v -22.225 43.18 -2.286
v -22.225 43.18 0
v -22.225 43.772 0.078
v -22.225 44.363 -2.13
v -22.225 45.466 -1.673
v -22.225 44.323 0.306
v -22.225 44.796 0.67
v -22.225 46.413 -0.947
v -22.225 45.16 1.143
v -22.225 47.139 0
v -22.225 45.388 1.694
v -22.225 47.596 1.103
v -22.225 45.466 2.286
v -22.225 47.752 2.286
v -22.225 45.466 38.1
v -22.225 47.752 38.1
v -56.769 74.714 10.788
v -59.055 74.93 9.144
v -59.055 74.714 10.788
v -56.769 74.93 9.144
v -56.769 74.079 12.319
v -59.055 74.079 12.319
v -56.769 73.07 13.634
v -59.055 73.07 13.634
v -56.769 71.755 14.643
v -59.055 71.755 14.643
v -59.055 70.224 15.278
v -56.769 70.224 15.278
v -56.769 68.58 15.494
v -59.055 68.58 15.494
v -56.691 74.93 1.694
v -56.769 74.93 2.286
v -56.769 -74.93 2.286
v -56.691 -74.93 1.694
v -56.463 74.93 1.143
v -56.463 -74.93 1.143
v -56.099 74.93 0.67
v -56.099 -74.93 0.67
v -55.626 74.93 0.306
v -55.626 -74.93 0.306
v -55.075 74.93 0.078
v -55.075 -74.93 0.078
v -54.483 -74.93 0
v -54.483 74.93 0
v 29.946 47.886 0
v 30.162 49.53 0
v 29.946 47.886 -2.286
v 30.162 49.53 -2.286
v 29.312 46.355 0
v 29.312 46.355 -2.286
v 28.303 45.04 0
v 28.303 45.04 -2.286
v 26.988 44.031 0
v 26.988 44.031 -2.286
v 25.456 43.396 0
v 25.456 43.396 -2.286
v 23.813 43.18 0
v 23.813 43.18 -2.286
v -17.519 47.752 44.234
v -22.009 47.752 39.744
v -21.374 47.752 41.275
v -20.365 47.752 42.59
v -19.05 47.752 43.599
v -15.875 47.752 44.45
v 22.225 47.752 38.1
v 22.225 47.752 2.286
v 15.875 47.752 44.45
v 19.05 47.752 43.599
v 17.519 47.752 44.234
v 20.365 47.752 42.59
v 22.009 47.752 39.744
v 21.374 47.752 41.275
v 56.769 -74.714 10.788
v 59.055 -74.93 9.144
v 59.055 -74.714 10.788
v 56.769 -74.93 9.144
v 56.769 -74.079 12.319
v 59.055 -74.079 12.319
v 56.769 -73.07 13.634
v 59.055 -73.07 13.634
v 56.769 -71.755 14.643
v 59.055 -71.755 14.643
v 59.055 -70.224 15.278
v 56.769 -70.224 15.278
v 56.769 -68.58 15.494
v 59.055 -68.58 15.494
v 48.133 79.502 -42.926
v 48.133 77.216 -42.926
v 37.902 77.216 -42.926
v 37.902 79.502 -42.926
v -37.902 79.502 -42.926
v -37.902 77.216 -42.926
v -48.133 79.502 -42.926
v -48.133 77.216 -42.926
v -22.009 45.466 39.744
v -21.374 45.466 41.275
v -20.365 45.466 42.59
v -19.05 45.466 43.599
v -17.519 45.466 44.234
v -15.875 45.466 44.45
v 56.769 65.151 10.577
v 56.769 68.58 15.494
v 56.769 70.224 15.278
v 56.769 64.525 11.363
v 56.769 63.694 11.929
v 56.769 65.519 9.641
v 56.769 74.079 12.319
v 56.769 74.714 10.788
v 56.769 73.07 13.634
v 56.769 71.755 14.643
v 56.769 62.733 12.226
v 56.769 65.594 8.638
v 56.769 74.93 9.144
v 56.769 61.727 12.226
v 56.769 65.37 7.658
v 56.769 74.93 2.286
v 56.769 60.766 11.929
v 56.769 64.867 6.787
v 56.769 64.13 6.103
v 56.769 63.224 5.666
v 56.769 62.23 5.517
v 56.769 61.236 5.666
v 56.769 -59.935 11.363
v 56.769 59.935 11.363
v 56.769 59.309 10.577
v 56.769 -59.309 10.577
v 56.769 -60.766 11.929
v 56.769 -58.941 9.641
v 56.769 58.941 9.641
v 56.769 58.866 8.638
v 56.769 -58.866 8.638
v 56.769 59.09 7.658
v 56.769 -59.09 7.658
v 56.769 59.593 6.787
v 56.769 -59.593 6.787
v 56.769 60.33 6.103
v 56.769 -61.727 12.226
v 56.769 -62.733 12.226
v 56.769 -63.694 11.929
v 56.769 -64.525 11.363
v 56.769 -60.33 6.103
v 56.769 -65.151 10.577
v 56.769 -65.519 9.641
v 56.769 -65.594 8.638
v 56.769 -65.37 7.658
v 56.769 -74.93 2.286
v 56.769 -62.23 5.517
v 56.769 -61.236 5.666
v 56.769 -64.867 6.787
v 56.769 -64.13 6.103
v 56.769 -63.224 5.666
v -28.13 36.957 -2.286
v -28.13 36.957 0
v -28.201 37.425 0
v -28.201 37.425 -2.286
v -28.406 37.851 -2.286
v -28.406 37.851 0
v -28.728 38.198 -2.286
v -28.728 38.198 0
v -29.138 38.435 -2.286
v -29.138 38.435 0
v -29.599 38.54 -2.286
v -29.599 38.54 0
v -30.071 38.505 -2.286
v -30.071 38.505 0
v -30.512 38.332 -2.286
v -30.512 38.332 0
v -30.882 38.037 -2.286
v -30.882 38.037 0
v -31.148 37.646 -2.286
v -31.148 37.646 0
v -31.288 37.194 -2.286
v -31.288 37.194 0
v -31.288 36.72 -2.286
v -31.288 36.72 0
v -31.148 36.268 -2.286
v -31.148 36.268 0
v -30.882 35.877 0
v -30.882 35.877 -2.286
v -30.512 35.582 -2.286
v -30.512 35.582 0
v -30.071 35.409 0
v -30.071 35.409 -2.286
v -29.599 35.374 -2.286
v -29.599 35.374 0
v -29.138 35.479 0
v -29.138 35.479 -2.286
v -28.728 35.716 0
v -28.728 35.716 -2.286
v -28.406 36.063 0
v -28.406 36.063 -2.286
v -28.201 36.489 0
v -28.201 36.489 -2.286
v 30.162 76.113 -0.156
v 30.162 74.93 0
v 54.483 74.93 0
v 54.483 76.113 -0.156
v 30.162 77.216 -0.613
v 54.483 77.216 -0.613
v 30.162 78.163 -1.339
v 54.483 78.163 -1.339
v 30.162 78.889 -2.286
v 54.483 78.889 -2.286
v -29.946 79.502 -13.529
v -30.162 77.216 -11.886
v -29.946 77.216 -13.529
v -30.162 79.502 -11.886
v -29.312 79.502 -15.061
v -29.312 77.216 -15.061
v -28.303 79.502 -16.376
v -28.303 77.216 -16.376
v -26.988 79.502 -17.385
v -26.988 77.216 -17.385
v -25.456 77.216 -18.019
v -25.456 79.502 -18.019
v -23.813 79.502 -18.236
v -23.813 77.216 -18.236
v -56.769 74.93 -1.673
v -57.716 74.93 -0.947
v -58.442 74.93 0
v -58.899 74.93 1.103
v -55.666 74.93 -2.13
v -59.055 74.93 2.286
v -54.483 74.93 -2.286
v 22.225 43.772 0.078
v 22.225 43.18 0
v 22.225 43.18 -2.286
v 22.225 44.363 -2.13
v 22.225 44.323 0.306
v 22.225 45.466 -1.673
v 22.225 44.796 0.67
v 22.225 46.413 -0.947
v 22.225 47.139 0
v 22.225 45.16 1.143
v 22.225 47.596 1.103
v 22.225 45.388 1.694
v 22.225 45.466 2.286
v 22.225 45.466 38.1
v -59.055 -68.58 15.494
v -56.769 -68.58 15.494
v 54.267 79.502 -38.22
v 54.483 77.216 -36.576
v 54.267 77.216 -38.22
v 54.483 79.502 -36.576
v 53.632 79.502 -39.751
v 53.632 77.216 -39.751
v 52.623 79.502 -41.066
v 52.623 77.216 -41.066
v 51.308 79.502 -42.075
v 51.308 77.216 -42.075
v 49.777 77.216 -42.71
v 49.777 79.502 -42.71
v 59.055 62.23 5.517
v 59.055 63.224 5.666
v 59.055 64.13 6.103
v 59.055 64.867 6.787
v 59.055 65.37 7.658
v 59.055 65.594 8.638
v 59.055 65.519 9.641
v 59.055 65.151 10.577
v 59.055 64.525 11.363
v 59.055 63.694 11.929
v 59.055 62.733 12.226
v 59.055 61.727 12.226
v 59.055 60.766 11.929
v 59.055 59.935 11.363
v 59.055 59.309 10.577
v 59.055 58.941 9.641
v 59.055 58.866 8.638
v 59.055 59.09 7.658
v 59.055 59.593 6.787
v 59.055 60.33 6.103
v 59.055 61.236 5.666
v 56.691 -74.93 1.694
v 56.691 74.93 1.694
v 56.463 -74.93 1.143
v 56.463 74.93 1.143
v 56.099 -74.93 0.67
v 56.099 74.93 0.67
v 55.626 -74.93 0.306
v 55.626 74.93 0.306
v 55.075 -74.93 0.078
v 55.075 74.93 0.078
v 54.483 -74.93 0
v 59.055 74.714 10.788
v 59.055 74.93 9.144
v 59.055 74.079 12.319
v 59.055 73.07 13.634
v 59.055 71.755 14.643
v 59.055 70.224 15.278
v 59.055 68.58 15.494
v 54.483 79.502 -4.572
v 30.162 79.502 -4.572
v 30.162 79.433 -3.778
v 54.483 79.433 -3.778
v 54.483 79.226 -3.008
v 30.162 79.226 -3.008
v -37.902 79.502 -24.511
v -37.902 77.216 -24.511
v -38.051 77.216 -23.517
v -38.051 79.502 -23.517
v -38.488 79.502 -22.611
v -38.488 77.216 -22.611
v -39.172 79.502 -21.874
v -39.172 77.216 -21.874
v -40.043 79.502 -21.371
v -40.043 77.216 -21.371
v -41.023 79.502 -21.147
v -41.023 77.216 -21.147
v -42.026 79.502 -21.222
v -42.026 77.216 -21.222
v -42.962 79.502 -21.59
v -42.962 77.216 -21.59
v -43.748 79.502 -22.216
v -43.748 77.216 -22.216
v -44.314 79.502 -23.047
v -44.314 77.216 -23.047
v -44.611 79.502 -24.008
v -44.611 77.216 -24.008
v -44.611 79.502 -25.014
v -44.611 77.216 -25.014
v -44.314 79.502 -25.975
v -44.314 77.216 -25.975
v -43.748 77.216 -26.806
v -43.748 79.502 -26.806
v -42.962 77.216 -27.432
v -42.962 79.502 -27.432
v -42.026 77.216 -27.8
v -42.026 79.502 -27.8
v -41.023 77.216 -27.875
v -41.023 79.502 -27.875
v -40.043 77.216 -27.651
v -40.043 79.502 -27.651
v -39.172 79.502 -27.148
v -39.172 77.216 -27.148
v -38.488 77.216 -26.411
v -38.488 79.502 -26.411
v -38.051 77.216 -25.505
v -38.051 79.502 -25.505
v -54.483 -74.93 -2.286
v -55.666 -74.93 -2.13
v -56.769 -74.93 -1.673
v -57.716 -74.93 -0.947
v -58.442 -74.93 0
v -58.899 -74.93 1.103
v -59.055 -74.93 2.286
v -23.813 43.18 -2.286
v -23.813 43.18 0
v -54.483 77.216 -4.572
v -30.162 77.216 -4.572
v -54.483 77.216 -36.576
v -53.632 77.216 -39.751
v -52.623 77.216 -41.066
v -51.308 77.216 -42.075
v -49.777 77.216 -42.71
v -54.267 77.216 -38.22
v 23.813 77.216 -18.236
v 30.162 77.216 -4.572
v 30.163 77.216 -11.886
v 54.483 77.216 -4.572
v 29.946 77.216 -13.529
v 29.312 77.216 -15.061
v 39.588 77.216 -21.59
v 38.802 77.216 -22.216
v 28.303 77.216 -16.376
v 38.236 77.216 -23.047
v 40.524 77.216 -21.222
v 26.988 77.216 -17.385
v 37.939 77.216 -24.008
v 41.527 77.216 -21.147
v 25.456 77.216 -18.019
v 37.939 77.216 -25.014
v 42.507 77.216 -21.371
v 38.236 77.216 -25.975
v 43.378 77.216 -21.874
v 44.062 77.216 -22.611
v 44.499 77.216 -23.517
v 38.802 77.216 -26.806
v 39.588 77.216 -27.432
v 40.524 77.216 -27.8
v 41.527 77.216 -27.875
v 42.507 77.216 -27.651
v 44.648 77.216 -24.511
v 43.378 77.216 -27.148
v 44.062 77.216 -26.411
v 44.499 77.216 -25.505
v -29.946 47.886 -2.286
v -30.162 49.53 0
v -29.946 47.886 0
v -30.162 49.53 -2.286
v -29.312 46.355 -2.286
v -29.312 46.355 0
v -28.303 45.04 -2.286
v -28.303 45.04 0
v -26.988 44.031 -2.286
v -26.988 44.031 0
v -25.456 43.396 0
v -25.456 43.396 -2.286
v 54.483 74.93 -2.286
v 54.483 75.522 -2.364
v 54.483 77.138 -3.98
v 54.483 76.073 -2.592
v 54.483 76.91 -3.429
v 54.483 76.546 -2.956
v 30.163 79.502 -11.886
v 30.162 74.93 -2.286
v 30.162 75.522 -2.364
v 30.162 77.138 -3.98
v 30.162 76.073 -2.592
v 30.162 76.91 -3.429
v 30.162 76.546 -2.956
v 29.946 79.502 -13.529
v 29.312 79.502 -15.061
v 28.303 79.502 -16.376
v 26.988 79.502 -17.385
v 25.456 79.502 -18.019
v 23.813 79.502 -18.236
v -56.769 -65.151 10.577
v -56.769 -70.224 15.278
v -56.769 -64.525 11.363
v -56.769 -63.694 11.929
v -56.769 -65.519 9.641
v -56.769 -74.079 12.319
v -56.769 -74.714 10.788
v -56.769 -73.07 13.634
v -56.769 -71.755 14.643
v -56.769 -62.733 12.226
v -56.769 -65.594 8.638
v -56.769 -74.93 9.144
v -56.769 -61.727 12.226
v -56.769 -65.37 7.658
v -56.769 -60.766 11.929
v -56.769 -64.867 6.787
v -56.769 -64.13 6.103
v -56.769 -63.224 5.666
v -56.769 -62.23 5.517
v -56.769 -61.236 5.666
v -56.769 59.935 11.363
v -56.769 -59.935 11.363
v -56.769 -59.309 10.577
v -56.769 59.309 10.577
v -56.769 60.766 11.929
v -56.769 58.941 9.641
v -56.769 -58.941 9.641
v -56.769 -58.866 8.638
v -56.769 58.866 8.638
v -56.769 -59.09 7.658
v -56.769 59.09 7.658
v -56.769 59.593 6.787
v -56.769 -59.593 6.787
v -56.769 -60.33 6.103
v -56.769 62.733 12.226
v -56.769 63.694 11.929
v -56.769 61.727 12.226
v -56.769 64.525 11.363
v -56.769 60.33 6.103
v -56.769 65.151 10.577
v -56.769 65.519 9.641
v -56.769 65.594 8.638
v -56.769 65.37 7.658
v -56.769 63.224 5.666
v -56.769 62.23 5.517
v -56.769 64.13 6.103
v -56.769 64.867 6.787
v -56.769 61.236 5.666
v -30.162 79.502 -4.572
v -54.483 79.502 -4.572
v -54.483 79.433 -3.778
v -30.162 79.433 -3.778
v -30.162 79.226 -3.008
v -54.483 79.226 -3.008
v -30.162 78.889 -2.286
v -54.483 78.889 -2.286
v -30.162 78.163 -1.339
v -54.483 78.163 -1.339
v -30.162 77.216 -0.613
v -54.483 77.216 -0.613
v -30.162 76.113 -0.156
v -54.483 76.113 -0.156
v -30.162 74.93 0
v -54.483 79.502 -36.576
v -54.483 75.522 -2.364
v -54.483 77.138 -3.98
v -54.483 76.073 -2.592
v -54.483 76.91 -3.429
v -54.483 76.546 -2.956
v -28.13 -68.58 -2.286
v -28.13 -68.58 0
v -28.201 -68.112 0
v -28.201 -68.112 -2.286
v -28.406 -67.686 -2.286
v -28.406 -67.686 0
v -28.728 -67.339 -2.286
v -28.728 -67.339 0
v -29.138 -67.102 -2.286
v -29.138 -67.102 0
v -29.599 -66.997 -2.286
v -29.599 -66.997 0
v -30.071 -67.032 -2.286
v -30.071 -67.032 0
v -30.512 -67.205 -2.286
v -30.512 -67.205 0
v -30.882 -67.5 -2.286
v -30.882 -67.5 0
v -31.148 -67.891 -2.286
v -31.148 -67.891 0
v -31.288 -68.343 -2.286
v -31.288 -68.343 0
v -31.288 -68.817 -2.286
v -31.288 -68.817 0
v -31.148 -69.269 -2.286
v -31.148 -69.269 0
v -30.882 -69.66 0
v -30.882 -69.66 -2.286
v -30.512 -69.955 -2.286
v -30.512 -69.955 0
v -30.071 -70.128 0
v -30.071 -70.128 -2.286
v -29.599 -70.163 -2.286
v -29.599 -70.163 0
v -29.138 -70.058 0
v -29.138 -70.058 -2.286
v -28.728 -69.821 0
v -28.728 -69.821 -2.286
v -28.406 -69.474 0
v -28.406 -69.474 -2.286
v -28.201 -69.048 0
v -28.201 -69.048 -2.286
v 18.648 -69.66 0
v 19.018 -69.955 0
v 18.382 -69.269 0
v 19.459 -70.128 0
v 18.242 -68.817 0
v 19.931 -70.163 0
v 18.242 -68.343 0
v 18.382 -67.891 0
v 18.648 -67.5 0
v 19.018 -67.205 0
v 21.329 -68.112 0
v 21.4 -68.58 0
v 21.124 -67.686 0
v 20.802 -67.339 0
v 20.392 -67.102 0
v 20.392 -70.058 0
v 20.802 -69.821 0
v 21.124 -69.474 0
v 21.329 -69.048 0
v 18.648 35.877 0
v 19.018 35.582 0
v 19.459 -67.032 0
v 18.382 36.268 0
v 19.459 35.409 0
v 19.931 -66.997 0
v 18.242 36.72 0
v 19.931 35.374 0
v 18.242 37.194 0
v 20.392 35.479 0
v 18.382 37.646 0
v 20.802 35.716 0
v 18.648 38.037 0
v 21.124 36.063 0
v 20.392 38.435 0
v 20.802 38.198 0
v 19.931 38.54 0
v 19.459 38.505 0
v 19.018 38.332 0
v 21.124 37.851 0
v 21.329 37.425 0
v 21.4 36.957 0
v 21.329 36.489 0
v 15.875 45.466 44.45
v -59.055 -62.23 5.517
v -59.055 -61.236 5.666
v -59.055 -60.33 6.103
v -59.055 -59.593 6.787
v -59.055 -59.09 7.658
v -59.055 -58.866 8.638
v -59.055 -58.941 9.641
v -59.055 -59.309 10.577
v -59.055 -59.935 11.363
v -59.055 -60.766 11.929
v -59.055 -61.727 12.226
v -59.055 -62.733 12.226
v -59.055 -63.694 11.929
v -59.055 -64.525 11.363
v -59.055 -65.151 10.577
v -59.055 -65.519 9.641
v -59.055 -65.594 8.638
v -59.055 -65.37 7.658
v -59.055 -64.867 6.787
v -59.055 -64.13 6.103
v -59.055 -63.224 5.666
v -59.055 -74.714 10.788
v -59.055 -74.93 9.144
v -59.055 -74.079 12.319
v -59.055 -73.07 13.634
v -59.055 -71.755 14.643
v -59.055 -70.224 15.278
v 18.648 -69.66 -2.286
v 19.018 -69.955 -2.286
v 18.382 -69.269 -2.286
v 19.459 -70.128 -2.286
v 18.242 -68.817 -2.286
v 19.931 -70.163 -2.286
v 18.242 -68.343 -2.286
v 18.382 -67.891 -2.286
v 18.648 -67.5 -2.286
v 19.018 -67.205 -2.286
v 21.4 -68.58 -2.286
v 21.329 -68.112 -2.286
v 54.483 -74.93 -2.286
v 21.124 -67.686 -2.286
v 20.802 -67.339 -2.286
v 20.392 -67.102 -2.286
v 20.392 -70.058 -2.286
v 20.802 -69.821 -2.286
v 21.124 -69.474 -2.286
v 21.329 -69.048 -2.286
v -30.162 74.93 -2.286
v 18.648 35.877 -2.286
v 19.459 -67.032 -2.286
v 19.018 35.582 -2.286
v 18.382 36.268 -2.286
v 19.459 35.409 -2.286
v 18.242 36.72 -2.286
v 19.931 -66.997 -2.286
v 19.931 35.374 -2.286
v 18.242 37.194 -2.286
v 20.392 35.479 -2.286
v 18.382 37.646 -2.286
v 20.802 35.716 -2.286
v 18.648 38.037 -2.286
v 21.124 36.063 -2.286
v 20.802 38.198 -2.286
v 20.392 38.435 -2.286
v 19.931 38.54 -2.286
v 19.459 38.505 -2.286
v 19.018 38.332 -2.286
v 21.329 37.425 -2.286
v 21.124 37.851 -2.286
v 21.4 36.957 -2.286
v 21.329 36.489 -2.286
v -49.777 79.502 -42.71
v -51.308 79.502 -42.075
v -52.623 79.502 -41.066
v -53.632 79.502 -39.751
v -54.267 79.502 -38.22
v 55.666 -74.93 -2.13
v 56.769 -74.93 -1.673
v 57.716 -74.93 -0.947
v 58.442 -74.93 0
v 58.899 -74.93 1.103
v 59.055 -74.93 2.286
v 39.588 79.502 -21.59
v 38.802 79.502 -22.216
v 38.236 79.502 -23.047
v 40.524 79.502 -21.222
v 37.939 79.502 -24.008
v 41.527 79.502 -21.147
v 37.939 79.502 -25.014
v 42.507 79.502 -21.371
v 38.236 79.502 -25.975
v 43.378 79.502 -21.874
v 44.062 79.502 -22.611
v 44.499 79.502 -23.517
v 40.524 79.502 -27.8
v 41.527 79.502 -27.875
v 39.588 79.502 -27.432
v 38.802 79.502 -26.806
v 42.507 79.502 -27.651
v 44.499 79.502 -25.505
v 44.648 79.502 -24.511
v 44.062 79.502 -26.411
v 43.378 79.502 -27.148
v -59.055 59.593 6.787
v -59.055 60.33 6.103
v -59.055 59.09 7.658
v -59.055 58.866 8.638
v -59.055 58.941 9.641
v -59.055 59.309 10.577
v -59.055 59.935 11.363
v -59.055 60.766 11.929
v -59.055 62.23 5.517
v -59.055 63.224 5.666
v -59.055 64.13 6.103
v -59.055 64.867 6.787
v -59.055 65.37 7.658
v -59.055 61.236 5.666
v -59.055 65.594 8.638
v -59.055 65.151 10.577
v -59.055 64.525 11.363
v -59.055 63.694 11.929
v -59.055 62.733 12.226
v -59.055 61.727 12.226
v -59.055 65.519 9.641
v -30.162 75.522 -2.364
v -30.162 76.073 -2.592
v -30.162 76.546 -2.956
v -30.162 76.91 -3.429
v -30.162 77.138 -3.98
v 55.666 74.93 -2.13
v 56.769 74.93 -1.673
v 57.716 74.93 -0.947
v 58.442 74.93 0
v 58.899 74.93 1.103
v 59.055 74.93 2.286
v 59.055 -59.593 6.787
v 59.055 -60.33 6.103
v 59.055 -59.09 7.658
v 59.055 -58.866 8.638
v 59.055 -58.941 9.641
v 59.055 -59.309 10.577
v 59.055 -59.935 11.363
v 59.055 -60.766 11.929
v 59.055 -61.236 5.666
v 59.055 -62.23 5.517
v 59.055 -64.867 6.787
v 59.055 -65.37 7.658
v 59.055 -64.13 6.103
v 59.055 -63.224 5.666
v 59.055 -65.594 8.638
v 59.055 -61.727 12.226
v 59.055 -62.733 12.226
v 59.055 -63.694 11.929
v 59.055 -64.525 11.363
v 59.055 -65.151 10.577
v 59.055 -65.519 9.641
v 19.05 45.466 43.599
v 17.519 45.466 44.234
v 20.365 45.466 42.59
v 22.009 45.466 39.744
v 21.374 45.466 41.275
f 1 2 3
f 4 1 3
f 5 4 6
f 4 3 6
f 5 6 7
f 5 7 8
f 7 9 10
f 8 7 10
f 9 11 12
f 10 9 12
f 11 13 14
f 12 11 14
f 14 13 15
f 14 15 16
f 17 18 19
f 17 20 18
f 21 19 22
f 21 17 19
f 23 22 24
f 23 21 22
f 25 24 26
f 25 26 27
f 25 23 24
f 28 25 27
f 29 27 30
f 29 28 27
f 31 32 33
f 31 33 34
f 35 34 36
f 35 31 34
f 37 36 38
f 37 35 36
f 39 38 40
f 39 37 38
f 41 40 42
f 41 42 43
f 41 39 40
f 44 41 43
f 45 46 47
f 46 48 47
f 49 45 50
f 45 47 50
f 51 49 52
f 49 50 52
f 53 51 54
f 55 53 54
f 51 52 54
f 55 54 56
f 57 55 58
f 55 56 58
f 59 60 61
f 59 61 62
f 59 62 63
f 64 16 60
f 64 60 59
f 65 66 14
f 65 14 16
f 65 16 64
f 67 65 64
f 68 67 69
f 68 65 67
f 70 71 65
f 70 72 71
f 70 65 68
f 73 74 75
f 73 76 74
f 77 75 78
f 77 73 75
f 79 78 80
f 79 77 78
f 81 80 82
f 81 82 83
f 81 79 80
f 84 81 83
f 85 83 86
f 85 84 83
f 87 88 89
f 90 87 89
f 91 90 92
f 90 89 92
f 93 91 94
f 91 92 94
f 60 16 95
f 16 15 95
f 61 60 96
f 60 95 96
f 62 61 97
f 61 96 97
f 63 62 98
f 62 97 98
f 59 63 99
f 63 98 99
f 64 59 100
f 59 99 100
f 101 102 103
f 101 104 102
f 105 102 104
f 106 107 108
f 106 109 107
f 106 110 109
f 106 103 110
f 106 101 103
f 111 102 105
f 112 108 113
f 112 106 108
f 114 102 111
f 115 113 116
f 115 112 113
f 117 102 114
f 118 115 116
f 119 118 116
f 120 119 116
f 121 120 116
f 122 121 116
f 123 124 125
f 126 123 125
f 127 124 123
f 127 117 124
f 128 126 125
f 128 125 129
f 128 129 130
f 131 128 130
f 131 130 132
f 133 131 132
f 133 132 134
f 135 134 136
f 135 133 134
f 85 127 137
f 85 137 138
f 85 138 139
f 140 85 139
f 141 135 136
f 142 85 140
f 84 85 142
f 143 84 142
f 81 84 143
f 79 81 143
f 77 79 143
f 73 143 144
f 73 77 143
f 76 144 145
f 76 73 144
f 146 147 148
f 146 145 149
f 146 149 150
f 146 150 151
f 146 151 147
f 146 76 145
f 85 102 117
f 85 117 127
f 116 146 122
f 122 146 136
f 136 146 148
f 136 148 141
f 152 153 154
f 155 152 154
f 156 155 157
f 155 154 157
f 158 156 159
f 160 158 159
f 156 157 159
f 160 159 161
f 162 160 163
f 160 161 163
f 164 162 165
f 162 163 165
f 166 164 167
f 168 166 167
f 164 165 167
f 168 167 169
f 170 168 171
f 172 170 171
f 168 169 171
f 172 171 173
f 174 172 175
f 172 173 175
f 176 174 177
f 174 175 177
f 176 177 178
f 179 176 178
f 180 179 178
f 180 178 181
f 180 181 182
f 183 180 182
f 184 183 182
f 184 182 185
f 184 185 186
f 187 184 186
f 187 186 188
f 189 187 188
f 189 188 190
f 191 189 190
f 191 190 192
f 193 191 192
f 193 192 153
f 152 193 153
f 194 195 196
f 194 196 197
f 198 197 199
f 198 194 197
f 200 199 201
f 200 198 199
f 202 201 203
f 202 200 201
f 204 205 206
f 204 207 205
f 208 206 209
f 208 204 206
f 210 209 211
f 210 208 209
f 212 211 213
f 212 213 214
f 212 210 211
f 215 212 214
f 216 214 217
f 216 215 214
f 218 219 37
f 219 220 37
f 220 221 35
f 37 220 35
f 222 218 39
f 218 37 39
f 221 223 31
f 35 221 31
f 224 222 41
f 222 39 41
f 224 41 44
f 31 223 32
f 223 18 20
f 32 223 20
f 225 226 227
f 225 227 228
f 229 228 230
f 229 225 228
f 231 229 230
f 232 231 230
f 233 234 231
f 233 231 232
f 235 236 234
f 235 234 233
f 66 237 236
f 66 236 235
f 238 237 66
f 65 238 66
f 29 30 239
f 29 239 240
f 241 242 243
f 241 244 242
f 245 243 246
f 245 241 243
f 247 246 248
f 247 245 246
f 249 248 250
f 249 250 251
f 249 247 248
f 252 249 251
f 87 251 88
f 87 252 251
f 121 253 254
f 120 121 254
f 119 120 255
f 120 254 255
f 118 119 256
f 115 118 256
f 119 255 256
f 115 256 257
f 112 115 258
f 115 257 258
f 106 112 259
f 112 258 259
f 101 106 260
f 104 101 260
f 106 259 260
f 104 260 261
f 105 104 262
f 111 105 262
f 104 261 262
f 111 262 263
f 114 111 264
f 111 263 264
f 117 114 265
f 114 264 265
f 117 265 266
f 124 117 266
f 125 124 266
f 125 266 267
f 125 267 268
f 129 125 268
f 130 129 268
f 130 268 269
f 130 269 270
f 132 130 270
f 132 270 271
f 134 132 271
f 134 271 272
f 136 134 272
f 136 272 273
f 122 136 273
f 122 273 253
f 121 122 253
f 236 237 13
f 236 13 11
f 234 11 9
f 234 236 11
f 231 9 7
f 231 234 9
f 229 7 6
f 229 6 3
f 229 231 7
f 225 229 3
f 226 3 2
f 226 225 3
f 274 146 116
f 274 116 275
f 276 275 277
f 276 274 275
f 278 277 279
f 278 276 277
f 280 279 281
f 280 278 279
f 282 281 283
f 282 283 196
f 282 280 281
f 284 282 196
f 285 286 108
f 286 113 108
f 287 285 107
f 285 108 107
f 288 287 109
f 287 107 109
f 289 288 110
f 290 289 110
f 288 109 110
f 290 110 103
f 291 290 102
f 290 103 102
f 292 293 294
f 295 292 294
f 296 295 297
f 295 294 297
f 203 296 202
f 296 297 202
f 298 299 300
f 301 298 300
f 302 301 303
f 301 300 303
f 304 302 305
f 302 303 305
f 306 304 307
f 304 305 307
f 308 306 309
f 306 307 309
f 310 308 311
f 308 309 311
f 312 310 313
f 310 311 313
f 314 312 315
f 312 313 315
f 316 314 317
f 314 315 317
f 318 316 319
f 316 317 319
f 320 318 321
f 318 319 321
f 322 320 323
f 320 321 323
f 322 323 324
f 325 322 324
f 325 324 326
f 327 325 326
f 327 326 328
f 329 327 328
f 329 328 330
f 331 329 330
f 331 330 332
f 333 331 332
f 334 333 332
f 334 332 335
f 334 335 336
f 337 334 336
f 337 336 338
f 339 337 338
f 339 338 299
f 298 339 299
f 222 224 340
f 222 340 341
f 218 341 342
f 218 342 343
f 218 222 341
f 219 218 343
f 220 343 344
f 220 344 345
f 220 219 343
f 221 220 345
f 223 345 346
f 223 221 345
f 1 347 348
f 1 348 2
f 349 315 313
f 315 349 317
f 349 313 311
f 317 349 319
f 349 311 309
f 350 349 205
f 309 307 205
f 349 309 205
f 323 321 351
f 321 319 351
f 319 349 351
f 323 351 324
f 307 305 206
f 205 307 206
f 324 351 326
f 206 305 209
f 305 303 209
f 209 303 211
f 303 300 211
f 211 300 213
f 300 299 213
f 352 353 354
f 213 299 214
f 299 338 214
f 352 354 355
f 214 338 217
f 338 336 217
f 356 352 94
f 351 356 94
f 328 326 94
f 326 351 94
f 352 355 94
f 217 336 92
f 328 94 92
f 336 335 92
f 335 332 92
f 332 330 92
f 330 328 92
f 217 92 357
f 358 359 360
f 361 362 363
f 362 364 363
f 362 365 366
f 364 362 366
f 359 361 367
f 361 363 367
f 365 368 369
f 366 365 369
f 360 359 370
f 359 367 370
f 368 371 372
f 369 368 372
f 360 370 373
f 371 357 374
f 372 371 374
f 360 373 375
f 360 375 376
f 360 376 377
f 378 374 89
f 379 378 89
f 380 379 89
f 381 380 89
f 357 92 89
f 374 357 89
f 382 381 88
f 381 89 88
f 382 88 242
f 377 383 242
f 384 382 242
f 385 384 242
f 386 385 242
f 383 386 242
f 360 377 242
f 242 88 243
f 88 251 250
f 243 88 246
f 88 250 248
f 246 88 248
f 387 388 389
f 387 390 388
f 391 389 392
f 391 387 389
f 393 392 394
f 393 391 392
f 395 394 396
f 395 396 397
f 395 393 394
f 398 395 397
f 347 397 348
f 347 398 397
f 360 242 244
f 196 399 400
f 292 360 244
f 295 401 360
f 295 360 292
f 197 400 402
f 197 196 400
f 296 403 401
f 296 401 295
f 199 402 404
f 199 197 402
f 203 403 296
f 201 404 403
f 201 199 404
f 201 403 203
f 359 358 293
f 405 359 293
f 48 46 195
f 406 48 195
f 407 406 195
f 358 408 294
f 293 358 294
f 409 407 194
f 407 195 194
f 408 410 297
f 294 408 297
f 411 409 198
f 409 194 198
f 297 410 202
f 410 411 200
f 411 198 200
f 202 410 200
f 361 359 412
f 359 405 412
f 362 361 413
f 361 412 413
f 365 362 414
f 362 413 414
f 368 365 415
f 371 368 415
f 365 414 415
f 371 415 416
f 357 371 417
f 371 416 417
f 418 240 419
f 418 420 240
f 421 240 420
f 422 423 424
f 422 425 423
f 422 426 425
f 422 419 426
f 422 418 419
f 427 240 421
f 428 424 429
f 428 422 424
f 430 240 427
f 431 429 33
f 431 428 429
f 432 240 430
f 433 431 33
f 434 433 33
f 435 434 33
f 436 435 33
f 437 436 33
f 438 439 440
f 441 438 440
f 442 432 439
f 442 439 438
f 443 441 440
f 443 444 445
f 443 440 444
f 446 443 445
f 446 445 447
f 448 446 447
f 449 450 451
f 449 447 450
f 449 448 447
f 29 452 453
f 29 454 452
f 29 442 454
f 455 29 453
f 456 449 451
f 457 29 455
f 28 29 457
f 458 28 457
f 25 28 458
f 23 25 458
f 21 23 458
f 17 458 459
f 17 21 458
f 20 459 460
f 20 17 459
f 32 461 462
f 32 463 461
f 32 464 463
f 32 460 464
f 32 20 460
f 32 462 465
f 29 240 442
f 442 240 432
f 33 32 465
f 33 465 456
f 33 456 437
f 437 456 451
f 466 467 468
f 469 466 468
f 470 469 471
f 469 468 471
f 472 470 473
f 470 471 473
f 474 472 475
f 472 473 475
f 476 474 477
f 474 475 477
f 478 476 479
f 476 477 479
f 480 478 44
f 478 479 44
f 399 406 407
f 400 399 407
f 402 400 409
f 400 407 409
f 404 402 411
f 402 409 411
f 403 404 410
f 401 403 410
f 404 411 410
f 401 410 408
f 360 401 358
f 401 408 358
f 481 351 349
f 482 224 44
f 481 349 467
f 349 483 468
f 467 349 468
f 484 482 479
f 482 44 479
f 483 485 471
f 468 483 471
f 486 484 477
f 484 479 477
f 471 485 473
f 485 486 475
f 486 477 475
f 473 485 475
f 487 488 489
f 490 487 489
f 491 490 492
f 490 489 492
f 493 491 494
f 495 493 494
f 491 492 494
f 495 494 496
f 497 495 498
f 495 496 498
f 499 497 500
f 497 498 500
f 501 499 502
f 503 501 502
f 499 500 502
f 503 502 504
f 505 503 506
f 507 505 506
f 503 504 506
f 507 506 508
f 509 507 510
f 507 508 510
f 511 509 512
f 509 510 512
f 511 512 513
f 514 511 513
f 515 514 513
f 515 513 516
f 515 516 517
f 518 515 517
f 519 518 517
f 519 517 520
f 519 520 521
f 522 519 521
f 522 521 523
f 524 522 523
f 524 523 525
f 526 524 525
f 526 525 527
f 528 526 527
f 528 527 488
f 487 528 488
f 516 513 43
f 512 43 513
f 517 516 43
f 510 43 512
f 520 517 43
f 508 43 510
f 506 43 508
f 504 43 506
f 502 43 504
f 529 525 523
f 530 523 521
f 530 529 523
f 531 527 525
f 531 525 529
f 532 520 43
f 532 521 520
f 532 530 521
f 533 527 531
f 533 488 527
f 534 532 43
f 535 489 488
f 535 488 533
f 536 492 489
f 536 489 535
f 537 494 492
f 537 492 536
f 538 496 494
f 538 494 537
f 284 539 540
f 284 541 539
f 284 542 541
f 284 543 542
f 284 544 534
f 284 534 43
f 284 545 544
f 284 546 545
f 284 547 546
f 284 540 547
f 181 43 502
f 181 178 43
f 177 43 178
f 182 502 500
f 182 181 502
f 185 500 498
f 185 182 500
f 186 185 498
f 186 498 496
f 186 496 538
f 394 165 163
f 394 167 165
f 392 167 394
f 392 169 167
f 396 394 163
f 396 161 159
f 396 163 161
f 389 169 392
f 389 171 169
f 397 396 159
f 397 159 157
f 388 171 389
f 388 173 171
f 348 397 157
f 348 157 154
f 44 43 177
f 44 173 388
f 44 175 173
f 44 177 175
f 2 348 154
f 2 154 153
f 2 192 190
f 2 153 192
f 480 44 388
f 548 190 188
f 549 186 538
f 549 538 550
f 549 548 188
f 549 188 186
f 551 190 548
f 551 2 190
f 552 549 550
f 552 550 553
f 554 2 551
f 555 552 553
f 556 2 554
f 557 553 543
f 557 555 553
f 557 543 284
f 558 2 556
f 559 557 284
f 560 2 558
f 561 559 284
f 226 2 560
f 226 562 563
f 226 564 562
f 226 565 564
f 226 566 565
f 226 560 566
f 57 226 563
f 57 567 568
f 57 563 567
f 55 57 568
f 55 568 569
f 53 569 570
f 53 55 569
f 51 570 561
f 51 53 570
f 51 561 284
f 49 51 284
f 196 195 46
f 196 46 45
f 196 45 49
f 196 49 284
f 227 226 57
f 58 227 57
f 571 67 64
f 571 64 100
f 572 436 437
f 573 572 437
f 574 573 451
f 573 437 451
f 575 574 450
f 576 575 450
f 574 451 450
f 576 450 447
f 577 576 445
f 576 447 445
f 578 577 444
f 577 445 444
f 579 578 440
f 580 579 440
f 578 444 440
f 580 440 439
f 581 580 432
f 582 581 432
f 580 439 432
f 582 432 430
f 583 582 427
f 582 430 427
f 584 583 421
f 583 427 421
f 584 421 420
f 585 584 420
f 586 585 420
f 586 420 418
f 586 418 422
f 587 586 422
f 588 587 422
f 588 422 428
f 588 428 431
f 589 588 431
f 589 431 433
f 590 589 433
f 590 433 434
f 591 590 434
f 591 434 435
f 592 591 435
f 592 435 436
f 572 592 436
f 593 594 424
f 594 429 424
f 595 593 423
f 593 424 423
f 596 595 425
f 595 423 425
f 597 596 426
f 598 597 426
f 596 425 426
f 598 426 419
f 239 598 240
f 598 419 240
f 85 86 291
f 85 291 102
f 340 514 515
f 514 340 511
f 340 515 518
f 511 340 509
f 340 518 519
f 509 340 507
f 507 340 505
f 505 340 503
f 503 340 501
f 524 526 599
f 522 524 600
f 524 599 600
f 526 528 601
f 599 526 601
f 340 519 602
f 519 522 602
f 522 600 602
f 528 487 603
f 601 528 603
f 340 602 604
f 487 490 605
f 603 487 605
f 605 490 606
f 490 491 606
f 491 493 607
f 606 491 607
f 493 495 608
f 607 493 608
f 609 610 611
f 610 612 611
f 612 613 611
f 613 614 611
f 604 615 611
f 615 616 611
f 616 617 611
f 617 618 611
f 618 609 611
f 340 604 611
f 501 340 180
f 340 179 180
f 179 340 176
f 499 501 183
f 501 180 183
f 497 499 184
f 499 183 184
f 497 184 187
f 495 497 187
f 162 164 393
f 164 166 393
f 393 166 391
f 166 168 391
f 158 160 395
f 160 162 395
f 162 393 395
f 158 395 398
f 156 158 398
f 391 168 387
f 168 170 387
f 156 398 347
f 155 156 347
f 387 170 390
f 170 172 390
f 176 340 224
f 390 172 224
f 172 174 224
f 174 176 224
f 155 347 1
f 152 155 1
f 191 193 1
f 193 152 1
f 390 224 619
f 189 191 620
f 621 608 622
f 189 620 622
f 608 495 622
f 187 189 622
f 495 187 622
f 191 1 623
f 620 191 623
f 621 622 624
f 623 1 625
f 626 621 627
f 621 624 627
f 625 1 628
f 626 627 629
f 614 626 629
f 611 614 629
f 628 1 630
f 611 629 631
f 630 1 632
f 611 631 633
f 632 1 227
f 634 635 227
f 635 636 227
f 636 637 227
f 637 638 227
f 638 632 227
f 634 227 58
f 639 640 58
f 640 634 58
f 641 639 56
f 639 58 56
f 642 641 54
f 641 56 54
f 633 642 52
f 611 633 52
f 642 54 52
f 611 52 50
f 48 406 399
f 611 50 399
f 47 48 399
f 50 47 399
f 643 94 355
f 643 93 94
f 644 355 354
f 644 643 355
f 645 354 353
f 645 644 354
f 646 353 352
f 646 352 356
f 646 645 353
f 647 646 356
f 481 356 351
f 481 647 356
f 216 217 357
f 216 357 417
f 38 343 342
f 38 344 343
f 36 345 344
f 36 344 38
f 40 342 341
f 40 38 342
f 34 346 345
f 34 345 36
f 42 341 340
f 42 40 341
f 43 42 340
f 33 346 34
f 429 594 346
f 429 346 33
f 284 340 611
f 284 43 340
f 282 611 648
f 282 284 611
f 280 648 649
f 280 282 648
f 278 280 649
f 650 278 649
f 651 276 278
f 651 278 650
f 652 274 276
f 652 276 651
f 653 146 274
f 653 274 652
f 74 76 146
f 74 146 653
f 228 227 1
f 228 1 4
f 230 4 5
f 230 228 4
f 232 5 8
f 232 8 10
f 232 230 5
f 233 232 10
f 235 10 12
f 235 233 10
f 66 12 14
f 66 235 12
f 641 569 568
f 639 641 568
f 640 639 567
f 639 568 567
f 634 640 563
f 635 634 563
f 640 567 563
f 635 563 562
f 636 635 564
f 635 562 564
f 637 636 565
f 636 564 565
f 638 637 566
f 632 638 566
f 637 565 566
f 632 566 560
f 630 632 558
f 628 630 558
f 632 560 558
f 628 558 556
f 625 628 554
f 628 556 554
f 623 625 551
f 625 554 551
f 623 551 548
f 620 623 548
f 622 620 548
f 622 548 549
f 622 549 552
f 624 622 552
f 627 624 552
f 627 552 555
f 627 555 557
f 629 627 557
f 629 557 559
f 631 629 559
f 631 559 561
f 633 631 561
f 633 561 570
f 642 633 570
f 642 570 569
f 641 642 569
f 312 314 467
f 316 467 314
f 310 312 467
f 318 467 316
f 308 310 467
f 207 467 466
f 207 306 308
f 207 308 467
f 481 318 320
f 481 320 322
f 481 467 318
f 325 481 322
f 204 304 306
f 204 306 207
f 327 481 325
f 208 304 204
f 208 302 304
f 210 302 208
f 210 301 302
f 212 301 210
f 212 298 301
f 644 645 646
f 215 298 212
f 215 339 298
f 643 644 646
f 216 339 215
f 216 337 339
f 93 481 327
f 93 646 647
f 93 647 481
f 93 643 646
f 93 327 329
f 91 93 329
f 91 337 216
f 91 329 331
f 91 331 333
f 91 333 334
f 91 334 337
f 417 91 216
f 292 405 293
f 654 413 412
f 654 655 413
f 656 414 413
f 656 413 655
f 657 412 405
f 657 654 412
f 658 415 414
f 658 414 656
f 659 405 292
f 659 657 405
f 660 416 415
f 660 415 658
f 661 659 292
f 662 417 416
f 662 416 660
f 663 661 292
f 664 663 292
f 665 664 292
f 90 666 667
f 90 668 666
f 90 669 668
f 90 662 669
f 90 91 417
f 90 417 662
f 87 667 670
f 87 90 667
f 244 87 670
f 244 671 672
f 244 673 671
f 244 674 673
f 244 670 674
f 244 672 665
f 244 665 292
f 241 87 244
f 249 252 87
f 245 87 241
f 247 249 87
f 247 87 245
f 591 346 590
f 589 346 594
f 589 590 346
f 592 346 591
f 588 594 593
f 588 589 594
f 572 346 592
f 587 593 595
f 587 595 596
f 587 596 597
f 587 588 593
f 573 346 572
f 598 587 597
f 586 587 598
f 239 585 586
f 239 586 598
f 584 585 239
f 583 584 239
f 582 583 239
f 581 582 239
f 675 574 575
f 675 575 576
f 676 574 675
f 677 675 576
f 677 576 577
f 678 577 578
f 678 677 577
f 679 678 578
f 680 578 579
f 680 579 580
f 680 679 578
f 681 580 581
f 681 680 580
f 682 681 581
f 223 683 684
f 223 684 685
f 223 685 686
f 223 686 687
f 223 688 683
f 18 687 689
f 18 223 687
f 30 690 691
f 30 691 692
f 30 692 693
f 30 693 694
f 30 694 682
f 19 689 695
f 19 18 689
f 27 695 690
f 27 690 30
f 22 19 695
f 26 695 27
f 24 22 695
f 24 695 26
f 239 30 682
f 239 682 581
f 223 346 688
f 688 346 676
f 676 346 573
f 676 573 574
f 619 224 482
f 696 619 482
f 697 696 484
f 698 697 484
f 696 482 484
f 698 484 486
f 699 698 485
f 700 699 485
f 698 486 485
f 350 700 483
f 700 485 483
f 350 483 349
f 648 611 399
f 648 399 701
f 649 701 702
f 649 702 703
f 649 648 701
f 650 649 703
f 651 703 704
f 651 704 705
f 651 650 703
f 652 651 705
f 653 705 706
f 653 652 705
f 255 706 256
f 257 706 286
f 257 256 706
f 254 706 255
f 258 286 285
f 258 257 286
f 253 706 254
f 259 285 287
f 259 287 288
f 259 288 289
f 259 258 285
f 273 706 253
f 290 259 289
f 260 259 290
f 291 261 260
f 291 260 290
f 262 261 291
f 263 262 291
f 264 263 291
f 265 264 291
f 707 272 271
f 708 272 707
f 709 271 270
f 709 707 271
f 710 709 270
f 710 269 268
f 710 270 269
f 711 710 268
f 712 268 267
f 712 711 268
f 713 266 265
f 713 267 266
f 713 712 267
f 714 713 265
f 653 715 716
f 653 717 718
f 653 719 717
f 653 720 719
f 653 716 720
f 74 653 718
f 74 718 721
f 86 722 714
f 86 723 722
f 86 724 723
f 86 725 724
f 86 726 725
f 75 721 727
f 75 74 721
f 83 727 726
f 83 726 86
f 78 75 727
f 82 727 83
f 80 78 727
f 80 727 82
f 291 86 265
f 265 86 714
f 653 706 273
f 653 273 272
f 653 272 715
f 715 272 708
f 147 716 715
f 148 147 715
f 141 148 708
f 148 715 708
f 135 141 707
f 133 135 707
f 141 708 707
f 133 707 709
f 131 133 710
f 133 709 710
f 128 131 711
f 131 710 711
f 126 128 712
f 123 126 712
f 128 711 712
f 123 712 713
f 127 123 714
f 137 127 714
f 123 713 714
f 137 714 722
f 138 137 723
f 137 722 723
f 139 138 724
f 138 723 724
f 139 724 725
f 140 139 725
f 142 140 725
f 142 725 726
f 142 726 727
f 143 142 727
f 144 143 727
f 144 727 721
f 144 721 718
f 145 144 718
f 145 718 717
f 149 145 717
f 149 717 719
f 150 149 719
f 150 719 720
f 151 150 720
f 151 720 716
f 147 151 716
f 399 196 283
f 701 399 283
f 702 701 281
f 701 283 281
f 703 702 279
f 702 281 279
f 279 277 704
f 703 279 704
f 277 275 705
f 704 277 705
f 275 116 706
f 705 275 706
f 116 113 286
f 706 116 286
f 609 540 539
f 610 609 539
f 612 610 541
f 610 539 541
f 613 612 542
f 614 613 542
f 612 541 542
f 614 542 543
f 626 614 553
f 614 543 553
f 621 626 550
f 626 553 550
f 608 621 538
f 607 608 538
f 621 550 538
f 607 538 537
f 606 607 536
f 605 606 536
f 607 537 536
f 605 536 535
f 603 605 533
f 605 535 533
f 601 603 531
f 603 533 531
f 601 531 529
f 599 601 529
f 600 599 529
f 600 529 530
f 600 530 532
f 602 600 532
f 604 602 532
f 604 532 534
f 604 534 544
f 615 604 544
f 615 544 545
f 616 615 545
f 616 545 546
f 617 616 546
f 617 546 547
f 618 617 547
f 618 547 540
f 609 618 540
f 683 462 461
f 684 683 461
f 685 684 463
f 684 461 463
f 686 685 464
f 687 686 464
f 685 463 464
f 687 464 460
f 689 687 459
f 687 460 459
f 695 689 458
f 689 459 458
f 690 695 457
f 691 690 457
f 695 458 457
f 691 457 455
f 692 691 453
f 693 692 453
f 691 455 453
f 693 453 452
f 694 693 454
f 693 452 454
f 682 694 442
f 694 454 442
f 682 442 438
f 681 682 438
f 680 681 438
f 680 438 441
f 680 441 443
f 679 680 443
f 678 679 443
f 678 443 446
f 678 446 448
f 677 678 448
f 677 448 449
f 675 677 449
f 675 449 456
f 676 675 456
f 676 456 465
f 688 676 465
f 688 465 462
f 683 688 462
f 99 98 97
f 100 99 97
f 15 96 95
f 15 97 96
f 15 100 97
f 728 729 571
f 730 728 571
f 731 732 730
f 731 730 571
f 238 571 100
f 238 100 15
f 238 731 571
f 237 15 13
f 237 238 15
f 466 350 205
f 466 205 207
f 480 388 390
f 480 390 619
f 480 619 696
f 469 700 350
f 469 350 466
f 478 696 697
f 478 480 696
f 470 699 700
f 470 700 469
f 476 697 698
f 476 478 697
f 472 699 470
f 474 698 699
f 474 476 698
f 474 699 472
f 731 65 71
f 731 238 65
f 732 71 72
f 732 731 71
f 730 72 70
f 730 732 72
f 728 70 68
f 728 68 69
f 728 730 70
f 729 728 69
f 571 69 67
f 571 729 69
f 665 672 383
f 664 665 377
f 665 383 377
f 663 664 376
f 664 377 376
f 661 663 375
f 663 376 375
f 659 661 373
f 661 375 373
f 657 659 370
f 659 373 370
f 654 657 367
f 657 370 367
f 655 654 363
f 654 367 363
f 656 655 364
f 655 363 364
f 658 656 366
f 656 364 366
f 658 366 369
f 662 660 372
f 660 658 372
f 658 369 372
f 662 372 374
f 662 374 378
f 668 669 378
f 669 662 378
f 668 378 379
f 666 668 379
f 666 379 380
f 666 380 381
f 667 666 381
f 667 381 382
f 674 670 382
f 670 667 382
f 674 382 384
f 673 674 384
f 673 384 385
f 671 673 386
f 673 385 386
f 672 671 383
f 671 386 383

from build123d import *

# Parameters (mm, degrees)
SKETCH1_W                      = 118.11
SKETCH1_H                      = 149.86
BASE_FLANGE1_DEPTH             = 2.286
EDGE_FLANGE1_STRIP_W           = 13.716
EDGE_FLANGE1_STRIP_H           = 2.286
EDGE_FLANGE1_STRIP_CUT_DEPTH   = 149.86
EDGE_FLANGE1_STRIP_2_W         = 13.716
EDGE_FLANGE1_STRIP_2_H         = 2.286
EDGE_FLANGE1_STRIP_CUT_2_DEPTH = 149.86
EDGE_FLANGE1_DEPTH             = 149.86
EDGE_FLANGE1_BEND_DEPTH        = 149.86
EDGE_FLANGE10_DEPTH            = 108.966
EDGE_FLANGE10_START            = 2.286
EDGE_FLANGE10_PROFILE_W        = 108.966
EDGE_FLANGE10_PROFILE_H        = 38.354
EDGE_FLANGE10_PROFILE_R        = 3.3734375
EDGE_FLANGE10_FLAT_DEPTH       = 2.286
UNFOLD6_START                  = -42.926
UNFOLD6_OUTLINE_W              = 108.966
UNFOLD6_OUTLINE_H              = 4.572
UNFOLD6_DEPTH                  = 40.64
UNFOLD6_START_2                = -2.286
UNFOLD6_2_OUTLINE_W            = 108.966
UNFOLD6_2_OUTLINE_H            = 43.740260605
UNFOLD6_2_OUTLINE_R            = 3.3734375
UNFOLD6_2_DEPTH                = 2.286
SKETCH121_W                    = 60.325
SKETCH121_H                    = 50.8
CUT_EXTRUDE3_DEPTH             = 134.454815623
EDGE_FLANGE16_DEPTH            = 44.45
FOLD3_START                    = -54.483
FOLD3_DEPTH                    = 108.966
FOLD3_START_2                  = -37.9015624
FOLD3_2_OUTLINE_W              = 2.286
FOLD3_2_OUTLINE_H              = 24.690260605
FOLD3_2_DEPTH                  = 75.8031248
FOLD3_3_DEPTH                  = 9.8345624
FOLD3_START_3                  = 44.6484376
FOLD3_4_DEPTH                  = 9.8345624
FOLD3_5_DEPTH                  = 24.3205
FOLD3_START_4                  = 30.1625
FOLD3_6_DEPTH                  = 24.3205
FOLD3_START_5                  = 77.216
FOLD3_7_DEPTH                  = 2.286
SKETCH128_R                    = 1.5875
CUT_EXTRUDE4_DEPTH             = 109.553505374
FILLET3_R                      = 6.35
SKETCH130_R                    = 3.3734375
CUT_EXTRUDE6_DEPTH             = 150.152078779


with BuildPart() as part:
    # Base-Flange1: sheet metal written as solids
    # Sketch1 → Base-Flange1 (new body)
    with BuildSketch(Plane.XY):
        Rectangle(SKETCH1_W, SKETCH1_H)
    extrude(amount=-BASE_FLANGE1_DEPTH)

    # Edge-Flange1: sheet metal written as solids
    # Edge-Flange1 strip (on a plane across the edge) → Edge-Flange1 strip cut (cut)
    with BuildSketch(Plane(origin=(-59.055, 74.93, 0), x_dir=(1, 0, 0), z_dir=(0, -1, 0))):
        with Locations((-2.286, -1.143)):
            Rectangle(EDGE_FLANGE1_STRIP_W, EDGE_FLANGE1_STRIP_H)
    extrude(amount=EDGE_FLANGE1_STRIP_CUT_DEPTH, mode=Mode.SUBTRACT)

    # Edge-Flange1 strip 2 (on a plane across the edge) → Edge-Flange1 strip cut 2 (cut)
    with BuildSketch(Plane(origin=(59.055, -74.93, 0), x_dir=(-1, 0, 0), z_dir=(0, 1, 0))):
        with Locations((-2.286, -1.143)):
            Rectangle(EDGE_FLANGE1_STRIP_2_W, EDGE_FLANGE1_STRIP_2_H)
    extrude(amount=EDGE_FLANGE1_STRIP_CUT_2_DEPTH, mode=Mode.SUBTRACT)

    # Edge-Flange1 section (on a plane across the edge) → Edge-Flange1 (add)
    with BuildSketch(Plane(origin=(-59.055, 74.93, 0), x_dir=(1, 0, 0), z_dir=(0, -1, 0))):
        with BuildLine():
            Line((0, 2.286), (0, 15.494))
            Line((0, 15.494), (2.286, 15.494))
            Line((2.286, 15.494), (2.286, 2.286))
            ThreePointArc((2.286, 2.286), (2.955553898, 0.669553898), (4.572, 0))
            Line((4.572, 0), (4.572, -2.286))
            ThreePointArc((4.572, -2.286), (1.339107796, -0.946892204), (0, 2.286))
        make_face()
    extrude(amount=EDGE_FLANGE1_DEPTH)

    # Edge-Flange1 section 2 (on a plane across the edge) → Edge-Flange1 bend (add)
    with BuildSketch(Plane(origin=(59.055, -74.93, 0), x_dir=(-1, 0, 0), z_dir=(0, 1, 0))):
        with BuildLine():
            Line((0, 2.286), (0, 15.494))
            Line((0, 15.494), (2.286, 15.494))
            Line((2.286, 15.494), (2.286, 2.286))
            ThreePointArc((2.286, 2.286), (2.955553898, 0.669553898), (4.572, 0))
            Line((4.572, 0), (4.572, -2.286))
            ThreePointArc((4.572, -2.286), (1.339107796, -0.946892204), (0, 2.286))
        make_face()
    extrude(amount=EDGE_FLANGE1_BEND_DEPTH)

    # Edge-Flange10: sheet metal written as solids
    # Edge-Flange10 bend section (on a plane across the edge) → Edge-Flange10 (add)
    with BuildSketch(Plane(origin=(-54.483, 77.216, -2.286), x_dir=(0, -1, 0), z_dir=(1, 0, 0))):
        with BuildLine():
            Line((-2.286, 2.286), (0, 2.286))
            ThreePointArc((0, 2.286), (0.669553898, 0.669553898), (2.286, 0))
            Line((2.286, 0), (2.286, -2.286))
            ThreePointArc((2.286, -2.286), (-0.946892204, -0.946892204), (-2.286, 2.286))
        make_face()
    extrude(amount=EDGE_FLANGE10_DEPTH)

    # Edge-Flange10 profile (on flange) → Edge-Flange10 flat (add)
    with BuildSketch(Plane(origin=(0, 77.216, -2.286), x_dir=(1, 0, 0), z_dir=(0, 1, 0)).offset(EDGE_FLANGE10_START)):
        with Locations((0, 21.463)):
            Rectangle(EDGE_FLANGE10_PROFILE_W, EDGE_FLANGE10_PROFILE_H)
        with Locations((41.275, 22.225)):
            Circle(EDGE_FLANGE10_PROFILE_R, mode=Mode.SUBTRACT)
        with Locations((-41.275, 22.225)):
            Circle(EDGE_FLANGE10_PROFILE_R, mode=Mode.SUBTRACT)
    extrude(amount=-EDGE_FLANGE10_FLAT_DEPTH)

    # Unfold6: read off the stored shape, not the designer's step
    # Unfold6 outline → Unfold6 (cut)
    with BuildSketch(Plane.XY.offset(UNFOLD6_START)):
        with Locations((0, 77.216)):
            Rectangle(UNFOLD6_OUTLINE_W, UNFOLD6_OUTLINE_H)
    extrude(amount=UNFOLD6_DEPTH, mode=Mode.SUBTRACT)

    # Unfold6 2 outline → Unfold6 2 (add)
    with BuildSketch(Plane.XY.offset(UNFOLD6_START_2)):
        with Locations((0, 96.800130303)):
            Rectangle(UNFOLD6_2_OUTLINE_W, UNFOLD6_2_OUTLINE_H)
        with Locations((-41.275, 100.255260605)):
            Circle(UNFOLD6_2_OUTLINE_R, mode=Mode.SUBTRACT)
        with Locations((41.275, 100.255260605)):
            Circle(UNFOLD6_2_OUTLINE_R, mode=Mode.SUBTRACT)
    extrude(amount=UNFOLD6_2_DEPTH)

    # Sketch121 → Cut-Extrude3 (cut, through all)
    with BuildSketch(Plane.XY):
        with Locations((0, 68.58)):
            Rectangle(SKETCH121_W, SKETCH121_H)
    extrude(amount=-CUT_EXTRUDE3_DEPTH, mode=Mode.SUBTRACT)

    # Edge-Flange16: sheet metal written as solids
    # Edge-Flange16 section (on a plane across the edge) → Edge-Flange16 (add)
    with BuildSketch(Plane(origin=(22.225, 45.466, 0), x_dir=(0, -1, 0), z_dir=(-1, 0, 0))):
        with BuildLine():
            Line((-2.286, 2.286), (-2.286, 44.45))
            Line((-2.286, 44.45), (0, 44.45))
            Line((0, 44.45), (0, 2.286))
            ThreePointArc((0, 2.286), (0.669553898, 0.669553898), (2.286, 0))
            Line((2.286, 0), (2.286, -2.286))
            ThreePointArc((2.286, -2.286), (-0.946892204, -0.946892204), (-2.286, 2.286))
        make_face()
    extrude(amount=EDGE_FLANGE16_DEPTH)

    # Fold3: read off the stored shape, not the designer's step
    # Fold3 outline → Fold3 (cut)
    with BuildSketch(Plane.YZ.offset(FOLD3_START)):
        with BuildLine():
            ThreePointArc((74.93, 0), (77.216, -0.612531854), (78.889468147, -2.286))
            Line((78.889468147, -2.286), (118.670260605, -2.286))
            Line((118.670260605, -2.286), (118.670260605, 0))
            Line((118.670260605, 0), (74.93, 0))
        make_face()
    extrude(amount=FOLD3_DEPTH, mode=Mode.SUBTRACT)

    # Fold3 3 outline → Fold3 3 (add)
    with BuildSketch(Plane.YZ.offset(FOLD3_START)):
        with BuildLine():
            ThreePointArc((74.93, -2.286), (76.546446102, -2.955553898), (77.216, -4.572))
            Line((77.216, -4.572), (77.216, -42.926))
            Line((77.216, -42.926), (79.502, -42.926))
            Line((79.502, -42.926), (79.502, -4.572))
            ThreePointArc((79.502, -4.572), (79.346212878, -3.388679326), (78.889468147, -2.286))
            Line((78.889468147, -2.286), (74.93, -2.286))
        make_face()
    extrude(amount=FOLD3_3_DEPTH)

    # Fold3 4 outline → Fold3 4 (add)
    with BuildSketch(Plane.YZ.offset(FOLD3_START_3)):
        with BuildLine():
            ThreePointArc((74.93, -2.286), (76.546446102, -2.955553898), (77.216, -4.572))
            Line((77.216, -4.572), (77.216, -42.926))
            Line((77.216, -42.926), (79.502, -42.926))
            Line((79.502, -42.926), (79.502, -4.572))
            ThreePointArc((79.502, -4.572), (79.346212878, -3.388679326), (78.889468147, -2.286))
            Line((78.889468147, -2.286), (74.93, -2.286))
        make_face()
    extrude(amount=FOLD3_4_DEPTH)



with BuildPart() as body_2:
    # Fold3 2 outline → Fold3 2 (new body)
    with BuildSketch(Plane.YZ.offset(FOLD3_START_2)):
        with Locations((78.359, -30.580869697)):
            Rectangle(FOLD3_2_OUTLINE_W, FOLD3_2_OUTLINE_H)
    extrude(amount=FOLD3_2_DEPTH)


with BuildPart() as part_1:
    add(part.part)

    add(body_2.part)  # Fold3 5 merges body 2
    # Fold3 5 outline → Fold3 5 (add)
    with BuildSketch(Plane.YZ.offset(FOLD3_START)):
        with BuildLine():
            ThreePointArc((74.93, -2.286), (76.546446102, -2.955553898), (77.216, -4.572))
            Line((77.216, -4.572), (77.216, -18.235739395))
            Line((77.216, -18.235739395), (79.502, -18.235739395))
            Line((79.502, -18.235739395), (79.502, -4.572))
            ThreePointArc((79.502, -4.572), (79.346212878, -3.388679326), (78.889468147, -2.286))
            Line((78.889468147, -2.286), (74.93, -2.286))
        make_face()
    extrude(amount=FOLD3_5_DEPTH)

    # Fold3 6 outline → Fold3 6 (add)
    with BuildSketch(Plane.YZ.offset(FOLD3_START_4)):
        with BuildLine():
            ThreePointArc((74.93, -2.286), (76.546446102, -2.955553898), (77.216, -4.572))
            Line((77.216, -4.572), (77.216, -18.235739395))
            Line((77.216, -18.235739395), (79.502, -18.235739395))
            Line((79.502, -18.235739395), (79.502, -4.572))
            ThreePointArc((79.502, -4.572), (79.346212878, -3.388679326), (78.889468147, -2.286))
            Line((78.889468147, -2.286), (74.93, -2.286))
        make_face()
    extrude(amount=FOLD3_6_DEPTH)

    # Fold3 7 outline → Fold3 7 (add)
    with BuildSketch(Plane(origin=(0, 0, 0), x_dir=(1, 0, 0), z_dir=(0, 1, 0)).offset(FOLD3_START_5)):
        with BuildLine():
            Line((44.6484376, 18.235739395), (44.6484375, 24.511))
            ThreePointArc((44.6484375, 24.511), (41.275, 21.1375625), (37.9015625, 24.511))
            Line((37.9015625, 24.511), (37.9015624, 18.235739395))
            Line((37.9015624, 18.235739395), (44.6484376, 18.235739395))
        make_face()
        with BuildLine():
            Line((-37.9015625, 24.511), (-37.9015624, 42.926))
            Line((-37.9015624, 42.926), (-44.6484376, 42.926))
            Line((-44.6484376, 42.926), (-44.6484375, 24.511))
            ThreePointArc((-44.6484375, 24.511), (-41.275, 27.8844375), (-37.9015625, 24.511))
        make_face()
        with BuildLine():
            ThreePointArc((37.9015625, 24.511), (41.275, 27.8844375), (44.6484375, 24.511))
            Line((44.6484375, 24.511), (44.6484376, 42.926))
            Line((44.6484376, 42.926), (37.9015624, 42.926))
            Line((37.9015624, 42.926), (37.9015625, 24.511))
        make_face()
        with BuildLine():
            Line((-37.9015624, 18.235739395), (-37.9015625, 24.511))
            ThreePointArc((-37.9015625, 24.511), (-41.275, 21.1375625), (-44.6484375, 24.511))
            Line((-44.6484375, 24.511), (-44.6484376, 18.235739395))
            Line((-44.6484376, 18.235739395), (-37.9015624, 18.235739395))
        make_face()
    extrude(amount=FOLD3_7_DEPTH)

    # Sketch128 → Cut-Extrude4 (cut, through all)
    with BuildSketch(Plane.XY):
        with Locations((-29.718, 36.957)):
            Circle(SKETCH128_R)
        with Locations((19.812, 36.957)):
            Circle(SKETCH128_R)
        with Locations((19.812, -68.58)):
            Circle(SKETCH128_R)
        with Locations((-29.718, -68.58)):
            Circle(SKETCH128_R)
    extrude(amount=-CUT_EXTRUDE4_DEPTH, mode=Mode.SUBTRACT)

    # Fillet3
    fillet3_edges = [part_1.edges().sort_by_distance(p)[0] for p in [
        (-57.912, 74.93, 15.494),
        (57.912, -74.93, 15.494),
        (-57.912, -74.93, 15.494),
        (-22.225, 46.609, 44.45),
        (22.225, 46.609, 44.45),
        (-54.483, 78.359, -42.926),
        (54.483, 78.359, -42.926),
        (57.912, 74.93, 15.494),
        (30.1625, 78.359, -18.235739395),
        (-30.1625, 78.359, -18.235739395),
        (-30.1625, 43.18, -1.143),
        (30.1625, 43.18, -1.143),
    ]]
    fillet(fillet3_edges, radius=FILLET3_R)

    # Sketch130 → Cut-Extrude6 (cut, through all)
    with BuildSketch(Plane(origin=(59.055, 0, 0), x_dir=(0, 0, -1), z_dir=(1, 0, 0))):
        with Locations((-8.89, -62.23)):
            Circle(SKETCH130_R)
        with Locations((-8.89, 62.23)):
            Circle(SKETCH130_R)
    extrude(amount=-CUT_EXTRUDE6_DEPTH, mode=Mode.SUBTRACT)


solid = part_1.part
